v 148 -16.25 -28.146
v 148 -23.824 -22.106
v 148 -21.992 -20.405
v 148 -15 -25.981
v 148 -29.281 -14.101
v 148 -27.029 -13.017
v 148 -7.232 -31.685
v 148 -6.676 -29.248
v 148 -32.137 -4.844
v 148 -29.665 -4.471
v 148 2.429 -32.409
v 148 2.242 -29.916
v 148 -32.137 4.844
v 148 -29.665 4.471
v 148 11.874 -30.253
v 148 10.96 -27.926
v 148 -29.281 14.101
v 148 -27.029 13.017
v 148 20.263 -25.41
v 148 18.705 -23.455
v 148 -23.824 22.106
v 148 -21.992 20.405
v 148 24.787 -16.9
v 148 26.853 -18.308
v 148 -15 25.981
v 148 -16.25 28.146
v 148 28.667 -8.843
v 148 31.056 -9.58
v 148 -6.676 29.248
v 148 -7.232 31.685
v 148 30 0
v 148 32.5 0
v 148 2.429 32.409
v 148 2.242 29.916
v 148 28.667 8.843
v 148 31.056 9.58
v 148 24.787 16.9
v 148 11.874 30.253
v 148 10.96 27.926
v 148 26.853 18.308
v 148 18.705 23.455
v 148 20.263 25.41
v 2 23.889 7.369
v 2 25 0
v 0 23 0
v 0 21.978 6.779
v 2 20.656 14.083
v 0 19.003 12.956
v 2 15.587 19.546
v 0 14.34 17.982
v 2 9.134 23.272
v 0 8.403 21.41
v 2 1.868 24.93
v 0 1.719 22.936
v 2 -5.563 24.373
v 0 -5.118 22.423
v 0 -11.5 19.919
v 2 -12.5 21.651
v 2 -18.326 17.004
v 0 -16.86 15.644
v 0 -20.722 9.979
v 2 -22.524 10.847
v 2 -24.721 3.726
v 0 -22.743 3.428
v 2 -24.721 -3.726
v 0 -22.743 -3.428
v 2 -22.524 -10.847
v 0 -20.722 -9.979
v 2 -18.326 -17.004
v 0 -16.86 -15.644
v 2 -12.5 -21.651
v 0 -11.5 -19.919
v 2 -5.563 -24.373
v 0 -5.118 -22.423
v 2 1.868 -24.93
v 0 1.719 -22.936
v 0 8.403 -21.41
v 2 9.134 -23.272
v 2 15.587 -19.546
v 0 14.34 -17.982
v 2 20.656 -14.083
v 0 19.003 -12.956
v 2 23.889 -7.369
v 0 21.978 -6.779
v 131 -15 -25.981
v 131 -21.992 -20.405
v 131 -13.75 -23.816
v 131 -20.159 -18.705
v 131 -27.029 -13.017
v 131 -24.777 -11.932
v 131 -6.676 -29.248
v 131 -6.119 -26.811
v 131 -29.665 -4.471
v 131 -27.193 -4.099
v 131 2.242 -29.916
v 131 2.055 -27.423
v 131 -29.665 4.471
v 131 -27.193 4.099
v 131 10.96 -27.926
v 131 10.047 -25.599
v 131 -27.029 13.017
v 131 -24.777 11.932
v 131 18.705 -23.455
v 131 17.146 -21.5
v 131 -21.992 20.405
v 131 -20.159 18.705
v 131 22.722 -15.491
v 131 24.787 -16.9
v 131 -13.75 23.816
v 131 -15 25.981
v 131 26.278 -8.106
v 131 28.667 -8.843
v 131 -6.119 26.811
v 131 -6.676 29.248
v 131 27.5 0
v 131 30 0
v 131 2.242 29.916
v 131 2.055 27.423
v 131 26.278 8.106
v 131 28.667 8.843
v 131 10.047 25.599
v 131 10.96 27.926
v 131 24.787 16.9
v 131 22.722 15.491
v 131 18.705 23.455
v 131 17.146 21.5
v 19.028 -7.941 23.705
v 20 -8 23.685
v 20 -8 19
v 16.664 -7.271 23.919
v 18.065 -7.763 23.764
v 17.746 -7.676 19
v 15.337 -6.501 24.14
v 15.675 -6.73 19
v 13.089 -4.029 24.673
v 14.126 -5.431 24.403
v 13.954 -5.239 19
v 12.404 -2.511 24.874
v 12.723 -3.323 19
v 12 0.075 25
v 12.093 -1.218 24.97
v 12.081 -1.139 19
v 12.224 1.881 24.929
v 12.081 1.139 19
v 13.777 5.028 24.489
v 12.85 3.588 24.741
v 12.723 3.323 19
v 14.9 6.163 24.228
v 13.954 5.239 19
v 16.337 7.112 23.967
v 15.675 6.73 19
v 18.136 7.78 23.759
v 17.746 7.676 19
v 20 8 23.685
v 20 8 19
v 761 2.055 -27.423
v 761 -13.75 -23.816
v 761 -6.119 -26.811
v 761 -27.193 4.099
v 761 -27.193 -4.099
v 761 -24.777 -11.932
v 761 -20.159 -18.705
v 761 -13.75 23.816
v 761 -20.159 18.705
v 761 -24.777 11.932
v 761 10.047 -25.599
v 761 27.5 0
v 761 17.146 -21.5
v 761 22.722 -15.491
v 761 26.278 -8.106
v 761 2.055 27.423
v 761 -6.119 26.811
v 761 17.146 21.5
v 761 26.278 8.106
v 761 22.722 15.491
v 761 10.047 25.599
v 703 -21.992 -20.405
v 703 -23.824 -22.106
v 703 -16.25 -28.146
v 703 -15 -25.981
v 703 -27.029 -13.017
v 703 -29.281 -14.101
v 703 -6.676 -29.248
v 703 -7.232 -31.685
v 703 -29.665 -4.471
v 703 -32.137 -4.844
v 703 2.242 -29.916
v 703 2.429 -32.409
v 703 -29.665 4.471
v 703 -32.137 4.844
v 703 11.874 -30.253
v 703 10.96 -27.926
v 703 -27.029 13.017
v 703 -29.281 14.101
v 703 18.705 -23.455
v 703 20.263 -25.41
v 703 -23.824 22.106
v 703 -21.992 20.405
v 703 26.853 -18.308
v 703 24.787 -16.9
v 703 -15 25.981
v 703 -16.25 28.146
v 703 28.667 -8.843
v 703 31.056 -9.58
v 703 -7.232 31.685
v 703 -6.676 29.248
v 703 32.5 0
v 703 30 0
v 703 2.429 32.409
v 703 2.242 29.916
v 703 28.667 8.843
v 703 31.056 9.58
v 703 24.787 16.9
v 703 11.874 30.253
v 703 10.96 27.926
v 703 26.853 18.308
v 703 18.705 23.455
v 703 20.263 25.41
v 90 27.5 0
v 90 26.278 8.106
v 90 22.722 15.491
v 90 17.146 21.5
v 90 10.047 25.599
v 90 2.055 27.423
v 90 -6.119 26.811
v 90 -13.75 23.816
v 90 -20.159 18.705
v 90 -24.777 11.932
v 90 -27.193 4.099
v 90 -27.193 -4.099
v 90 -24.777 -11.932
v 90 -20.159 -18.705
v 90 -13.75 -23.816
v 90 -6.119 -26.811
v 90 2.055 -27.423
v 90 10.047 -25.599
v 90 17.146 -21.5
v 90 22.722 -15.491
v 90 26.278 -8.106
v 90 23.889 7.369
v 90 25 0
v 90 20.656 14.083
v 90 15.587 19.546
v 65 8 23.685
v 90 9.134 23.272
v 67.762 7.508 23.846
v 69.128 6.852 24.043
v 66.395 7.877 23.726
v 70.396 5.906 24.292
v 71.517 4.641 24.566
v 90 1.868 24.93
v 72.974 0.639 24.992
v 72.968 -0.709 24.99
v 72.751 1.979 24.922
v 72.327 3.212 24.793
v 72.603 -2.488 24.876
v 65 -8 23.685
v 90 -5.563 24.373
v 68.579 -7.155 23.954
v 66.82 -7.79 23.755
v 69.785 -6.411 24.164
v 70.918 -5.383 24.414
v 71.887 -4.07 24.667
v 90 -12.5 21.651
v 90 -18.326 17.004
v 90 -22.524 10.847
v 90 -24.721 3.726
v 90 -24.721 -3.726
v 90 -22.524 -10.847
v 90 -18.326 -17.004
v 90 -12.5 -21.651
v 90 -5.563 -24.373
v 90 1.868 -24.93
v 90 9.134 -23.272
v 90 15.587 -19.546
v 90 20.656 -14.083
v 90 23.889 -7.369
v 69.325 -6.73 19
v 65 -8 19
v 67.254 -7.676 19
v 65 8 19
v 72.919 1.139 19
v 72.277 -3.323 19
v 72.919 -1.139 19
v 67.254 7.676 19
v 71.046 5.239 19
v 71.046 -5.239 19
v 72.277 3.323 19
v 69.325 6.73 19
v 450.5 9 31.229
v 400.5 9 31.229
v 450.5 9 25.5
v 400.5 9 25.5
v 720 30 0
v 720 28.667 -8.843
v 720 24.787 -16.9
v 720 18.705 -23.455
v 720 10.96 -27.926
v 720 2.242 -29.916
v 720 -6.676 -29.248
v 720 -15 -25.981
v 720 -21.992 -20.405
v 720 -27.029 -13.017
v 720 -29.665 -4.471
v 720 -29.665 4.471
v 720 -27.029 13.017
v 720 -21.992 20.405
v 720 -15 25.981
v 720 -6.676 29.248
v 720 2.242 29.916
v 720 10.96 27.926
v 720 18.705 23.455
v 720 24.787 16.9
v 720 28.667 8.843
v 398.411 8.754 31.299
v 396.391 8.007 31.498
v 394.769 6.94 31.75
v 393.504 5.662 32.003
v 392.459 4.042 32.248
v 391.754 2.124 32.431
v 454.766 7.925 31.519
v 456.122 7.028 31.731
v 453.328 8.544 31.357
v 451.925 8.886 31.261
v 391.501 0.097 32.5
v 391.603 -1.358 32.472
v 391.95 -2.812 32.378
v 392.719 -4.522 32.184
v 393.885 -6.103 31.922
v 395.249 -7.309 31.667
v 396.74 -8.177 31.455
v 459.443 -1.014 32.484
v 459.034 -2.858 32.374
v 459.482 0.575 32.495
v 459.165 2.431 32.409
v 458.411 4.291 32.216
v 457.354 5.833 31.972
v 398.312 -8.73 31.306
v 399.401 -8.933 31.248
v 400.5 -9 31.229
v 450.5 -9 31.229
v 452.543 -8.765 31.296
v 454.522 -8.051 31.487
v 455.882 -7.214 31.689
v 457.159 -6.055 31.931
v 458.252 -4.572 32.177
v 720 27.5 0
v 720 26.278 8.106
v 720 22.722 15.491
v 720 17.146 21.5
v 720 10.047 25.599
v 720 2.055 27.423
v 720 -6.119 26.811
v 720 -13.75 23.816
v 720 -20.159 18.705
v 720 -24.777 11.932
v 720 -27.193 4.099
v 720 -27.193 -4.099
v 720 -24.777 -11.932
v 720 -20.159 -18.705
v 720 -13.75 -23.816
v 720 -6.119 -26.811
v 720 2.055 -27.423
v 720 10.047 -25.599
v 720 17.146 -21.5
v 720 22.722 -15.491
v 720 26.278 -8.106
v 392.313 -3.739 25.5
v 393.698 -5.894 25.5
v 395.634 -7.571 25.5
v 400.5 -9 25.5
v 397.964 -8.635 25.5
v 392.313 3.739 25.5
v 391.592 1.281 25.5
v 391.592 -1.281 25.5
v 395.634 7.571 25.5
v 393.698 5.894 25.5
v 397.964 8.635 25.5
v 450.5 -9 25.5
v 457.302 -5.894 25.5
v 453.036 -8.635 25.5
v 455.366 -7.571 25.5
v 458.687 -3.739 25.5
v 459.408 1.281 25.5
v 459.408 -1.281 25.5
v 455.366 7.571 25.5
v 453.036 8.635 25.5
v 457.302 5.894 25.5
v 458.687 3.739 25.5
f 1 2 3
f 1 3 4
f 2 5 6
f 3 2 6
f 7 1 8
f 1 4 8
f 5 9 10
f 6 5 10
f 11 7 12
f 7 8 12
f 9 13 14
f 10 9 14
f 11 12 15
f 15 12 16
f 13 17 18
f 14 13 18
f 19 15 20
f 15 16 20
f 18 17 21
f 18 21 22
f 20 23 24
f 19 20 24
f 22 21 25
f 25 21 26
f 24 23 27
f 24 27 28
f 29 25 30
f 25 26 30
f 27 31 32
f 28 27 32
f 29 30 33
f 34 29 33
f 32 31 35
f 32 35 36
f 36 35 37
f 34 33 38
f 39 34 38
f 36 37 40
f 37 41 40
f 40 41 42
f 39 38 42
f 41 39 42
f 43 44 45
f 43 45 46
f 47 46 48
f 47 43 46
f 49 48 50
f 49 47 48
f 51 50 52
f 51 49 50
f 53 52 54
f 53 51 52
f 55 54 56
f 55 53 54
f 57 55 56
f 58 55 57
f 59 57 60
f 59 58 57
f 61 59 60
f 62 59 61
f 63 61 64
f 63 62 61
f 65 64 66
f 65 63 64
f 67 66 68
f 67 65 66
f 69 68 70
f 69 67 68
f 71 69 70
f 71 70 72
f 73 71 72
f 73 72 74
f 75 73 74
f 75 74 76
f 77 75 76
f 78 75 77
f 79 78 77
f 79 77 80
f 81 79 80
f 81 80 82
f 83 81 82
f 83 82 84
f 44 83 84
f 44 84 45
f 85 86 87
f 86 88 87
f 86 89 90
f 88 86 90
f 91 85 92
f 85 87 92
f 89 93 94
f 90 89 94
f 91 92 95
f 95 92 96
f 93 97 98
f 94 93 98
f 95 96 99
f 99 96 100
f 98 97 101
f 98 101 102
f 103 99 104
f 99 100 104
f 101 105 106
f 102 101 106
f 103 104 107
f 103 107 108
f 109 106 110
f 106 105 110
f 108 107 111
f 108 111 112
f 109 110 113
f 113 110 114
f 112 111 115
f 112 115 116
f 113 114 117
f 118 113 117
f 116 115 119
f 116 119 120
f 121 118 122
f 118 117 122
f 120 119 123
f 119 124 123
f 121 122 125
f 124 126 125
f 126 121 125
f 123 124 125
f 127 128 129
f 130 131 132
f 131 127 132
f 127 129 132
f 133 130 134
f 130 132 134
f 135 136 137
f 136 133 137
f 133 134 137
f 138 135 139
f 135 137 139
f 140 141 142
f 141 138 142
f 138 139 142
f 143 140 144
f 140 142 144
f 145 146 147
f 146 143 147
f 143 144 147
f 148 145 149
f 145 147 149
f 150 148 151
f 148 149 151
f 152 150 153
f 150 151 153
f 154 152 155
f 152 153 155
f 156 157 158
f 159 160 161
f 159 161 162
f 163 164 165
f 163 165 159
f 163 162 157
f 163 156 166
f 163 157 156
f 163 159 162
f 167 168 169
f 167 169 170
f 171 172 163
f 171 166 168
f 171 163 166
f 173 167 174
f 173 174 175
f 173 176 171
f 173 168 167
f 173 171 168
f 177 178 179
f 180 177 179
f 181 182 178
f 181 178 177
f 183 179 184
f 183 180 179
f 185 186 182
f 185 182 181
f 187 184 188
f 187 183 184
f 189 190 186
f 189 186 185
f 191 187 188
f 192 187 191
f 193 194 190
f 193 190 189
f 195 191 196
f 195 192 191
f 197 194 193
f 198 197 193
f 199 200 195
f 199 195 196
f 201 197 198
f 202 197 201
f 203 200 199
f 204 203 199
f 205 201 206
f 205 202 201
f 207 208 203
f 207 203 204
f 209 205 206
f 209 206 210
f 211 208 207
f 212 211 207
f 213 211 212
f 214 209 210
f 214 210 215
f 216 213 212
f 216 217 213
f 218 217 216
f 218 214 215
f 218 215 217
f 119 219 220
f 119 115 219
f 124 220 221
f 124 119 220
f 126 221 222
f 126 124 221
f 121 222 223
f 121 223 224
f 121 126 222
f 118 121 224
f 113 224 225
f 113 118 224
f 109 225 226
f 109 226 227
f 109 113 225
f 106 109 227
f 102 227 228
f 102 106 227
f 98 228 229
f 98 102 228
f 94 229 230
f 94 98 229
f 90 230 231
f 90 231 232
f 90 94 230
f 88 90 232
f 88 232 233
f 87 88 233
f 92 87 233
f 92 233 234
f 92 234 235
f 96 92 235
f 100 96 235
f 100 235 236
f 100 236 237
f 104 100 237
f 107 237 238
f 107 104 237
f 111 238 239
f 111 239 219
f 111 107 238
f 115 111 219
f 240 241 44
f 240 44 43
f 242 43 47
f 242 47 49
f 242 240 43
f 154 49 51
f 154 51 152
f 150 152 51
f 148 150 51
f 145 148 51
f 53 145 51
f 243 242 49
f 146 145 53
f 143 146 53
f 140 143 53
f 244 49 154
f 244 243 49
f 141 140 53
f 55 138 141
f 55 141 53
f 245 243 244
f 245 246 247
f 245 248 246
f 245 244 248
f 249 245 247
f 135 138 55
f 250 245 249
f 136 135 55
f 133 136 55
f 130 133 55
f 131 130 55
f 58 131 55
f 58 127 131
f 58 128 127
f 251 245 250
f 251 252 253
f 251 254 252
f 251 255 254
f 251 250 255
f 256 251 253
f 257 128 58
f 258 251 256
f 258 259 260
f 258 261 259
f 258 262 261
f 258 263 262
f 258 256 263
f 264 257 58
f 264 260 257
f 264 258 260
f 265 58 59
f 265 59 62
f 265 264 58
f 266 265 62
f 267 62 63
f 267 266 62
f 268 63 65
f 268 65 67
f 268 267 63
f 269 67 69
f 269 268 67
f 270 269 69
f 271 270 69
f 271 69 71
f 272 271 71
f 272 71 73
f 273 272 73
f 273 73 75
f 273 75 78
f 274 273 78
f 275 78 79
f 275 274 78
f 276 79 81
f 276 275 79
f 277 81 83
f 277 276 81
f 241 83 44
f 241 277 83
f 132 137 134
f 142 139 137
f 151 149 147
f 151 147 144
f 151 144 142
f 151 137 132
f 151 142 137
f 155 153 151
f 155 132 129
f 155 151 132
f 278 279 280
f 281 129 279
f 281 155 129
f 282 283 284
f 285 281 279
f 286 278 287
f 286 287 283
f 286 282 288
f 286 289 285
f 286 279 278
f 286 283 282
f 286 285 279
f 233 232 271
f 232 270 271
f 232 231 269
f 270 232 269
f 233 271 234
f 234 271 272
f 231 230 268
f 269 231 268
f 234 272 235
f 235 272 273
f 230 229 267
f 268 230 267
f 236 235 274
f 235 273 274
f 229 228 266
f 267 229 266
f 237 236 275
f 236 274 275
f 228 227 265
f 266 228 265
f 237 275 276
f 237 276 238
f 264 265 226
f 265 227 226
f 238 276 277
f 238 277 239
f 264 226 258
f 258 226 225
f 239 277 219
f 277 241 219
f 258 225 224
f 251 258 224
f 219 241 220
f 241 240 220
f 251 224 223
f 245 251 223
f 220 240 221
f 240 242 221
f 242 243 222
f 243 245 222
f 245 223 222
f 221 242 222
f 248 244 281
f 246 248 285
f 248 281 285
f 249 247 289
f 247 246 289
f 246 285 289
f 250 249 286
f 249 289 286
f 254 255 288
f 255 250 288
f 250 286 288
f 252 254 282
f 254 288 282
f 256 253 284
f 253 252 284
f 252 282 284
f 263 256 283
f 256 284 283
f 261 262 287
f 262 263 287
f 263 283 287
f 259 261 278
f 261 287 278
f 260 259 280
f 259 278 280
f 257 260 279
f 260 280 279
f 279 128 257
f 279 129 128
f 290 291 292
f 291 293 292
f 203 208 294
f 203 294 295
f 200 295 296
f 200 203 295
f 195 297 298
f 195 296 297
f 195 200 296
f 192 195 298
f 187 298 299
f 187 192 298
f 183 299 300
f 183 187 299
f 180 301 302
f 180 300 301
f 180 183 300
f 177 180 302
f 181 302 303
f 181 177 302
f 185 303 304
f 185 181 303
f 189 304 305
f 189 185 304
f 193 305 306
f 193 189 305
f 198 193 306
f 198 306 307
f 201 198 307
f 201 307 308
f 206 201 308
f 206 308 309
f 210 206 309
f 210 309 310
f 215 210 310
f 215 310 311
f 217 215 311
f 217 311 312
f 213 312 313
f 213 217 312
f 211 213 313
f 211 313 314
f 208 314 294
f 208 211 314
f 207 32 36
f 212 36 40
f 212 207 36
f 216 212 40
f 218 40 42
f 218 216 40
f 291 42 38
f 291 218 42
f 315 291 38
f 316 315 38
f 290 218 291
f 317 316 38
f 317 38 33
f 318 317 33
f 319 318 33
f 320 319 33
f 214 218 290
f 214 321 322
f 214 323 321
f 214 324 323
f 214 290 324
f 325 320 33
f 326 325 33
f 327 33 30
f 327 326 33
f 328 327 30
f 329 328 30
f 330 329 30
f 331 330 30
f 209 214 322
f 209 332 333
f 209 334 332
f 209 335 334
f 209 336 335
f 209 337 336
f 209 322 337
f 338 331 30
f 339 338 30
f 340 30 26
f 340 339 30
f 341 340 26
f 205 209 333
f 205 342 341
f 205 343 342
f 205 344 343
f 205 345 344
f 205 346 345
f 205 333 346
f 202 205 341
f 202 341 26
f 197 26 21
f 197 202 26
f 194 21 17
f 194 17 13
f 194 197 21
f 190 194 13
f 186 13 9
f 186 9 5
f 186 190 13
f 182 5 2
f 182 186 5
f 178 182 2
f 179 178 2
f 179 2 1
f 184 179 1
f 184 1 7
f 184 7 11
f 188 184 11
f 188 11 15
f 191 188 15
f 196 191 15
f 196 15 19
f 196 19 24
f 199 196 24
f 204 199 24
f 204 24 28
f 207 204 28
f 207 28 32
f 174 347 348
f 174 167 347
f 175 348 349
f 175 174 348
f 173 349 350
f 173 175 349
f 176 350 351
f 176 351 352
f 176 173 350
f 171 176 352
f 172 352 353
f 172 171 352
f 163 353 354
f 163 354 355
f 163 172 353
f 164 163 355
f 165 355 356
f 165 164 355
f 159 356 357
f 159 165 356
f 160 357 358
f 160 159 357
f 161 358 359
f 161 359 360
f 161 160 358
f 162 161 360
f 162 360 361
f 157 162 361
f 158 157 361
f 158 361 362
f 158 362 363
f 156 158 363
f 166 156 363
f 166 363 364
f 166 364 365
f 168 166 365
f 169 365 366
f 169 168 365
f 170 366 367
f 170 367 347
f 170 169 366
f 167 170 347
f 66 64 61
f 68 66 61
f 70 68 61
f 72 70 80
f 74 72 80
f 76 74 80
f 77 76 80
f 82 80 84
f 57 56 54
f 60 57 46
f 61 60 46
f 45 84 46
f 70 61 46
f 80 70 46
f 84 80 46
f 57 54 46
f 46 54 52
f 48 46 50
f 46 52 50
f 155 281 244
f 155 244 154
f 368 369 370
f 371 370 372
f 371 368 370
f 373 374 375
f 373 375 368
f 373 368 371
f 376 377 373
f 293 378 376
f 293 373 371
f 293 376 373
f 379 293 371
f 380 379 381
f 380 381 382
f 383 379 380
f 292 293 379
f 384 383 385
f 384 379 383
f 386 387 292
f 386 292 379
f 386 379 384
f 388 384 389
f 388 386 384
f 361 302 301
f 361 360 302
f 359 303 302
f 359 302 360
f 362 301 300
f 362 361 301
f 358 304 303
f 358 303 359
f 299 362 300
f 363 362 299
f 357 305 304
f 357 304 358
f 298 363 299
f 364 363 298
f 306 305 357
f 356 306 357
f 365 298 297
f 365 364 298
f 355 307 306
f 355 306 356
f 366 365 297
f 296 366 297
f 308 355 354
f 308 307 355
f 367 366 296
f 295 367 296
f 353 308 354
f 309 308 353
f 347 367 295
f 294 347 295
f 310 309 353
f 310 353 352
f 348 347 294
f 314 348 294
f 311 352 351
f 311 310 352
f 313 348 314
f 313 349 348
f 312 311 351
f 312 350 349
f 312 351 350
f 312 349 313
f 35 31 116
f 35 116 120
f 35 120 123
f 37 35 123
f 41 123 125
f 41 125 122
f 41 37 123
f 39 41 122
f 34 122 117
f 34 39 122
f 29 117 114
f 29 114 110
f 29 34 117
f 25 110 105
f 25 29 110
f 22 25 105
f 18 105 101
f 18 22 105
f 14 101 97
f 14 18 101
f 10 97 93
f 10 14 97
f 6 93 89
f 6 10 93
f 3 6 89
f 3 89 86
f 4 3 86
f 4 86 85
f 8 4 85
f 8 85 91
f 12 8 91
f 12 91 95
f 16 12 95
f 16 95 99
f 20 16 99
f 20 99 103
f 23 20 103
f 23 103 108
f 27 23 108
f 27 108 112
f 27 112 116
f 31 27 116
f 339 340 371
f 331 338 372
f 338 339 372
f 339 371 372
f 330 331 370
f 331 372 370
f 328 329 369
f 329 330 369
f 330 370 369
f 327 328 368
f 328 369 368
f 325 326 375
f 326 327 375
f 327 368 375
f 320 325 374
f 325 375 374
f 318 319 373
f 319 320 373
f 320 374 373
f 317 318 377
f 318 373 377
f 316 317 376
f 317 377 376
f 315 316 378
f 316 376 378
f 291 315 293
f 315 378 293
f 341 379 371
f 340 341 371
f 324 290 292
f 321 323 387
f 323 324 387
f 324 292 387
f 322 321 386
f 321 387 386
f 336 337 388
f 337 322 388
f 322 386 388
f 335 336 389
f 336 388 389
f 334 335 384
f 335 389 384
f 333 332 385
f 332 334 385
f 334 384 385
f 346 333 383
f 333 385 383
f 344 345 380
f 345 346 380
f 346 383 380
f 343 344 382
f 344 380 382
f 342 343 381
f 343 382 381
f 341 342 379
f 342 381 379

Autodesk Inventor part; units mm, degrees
ref_plane "YZ Plane" through (0, 0, 0) normal (1, 0, 0) x (0, 1, 0)
sketch "Эскиз1" plane through (0, 0, 0) normal (0, 0, 1) x (1, 0, 0)
  line L0 (0, 0) -> (761, 0)
  line L1 (0, 0) -> (0, 25)
  line L2 (0, 25) -> (90, 25)
  line L3 (90, 25) -> (90, 27.5)
  line L4 (90, 27.5) -> (131, 27.5)
  line L5 (131, 27.5) -> (131, 30)
  line L6 (425.5, 30) -> (425.5, 0) construction
  line L7 (720, 27.5) -> (720, 30)
  line L8 (131, 30) -> (148, 30)
  line L9 (148, 30) -> (148, 32.5)
  line L10 (148, 32.5) -> (181, 32.5)
  line L11 (720, 30) -> (703, 30)
  line L12 (703, 30) -> (703, 32.5)
  line L13 (703, 32.5) -> (181, 32.5)
  line L14 (720, 27.5) -> (761, 27.5)
  line L15 (761, 27.5) -> (761, 0)
  dimension "d0" = 50
  dimension "d1" = 55
  dimension "d2" = 90
  dimension "d3" = 41
  dimension "d14" = 17
  dimension "d15" = 60
  dimension "d16" = 65
  dimension "d27" = 41
  dimension "d29" = 630
revolve "Вращение1" add sketch "Эскиз1" angle 360 about axis through (0, 0, 0) along (1, 0, 0)
ref_plane "РабПлоскость1" through (0, 0, 19) normal (0, 0, 1) x (1, 0, 0)
sketch "Эскиз2" plane through (0, 0, 19) normal (0, 0, 1) x (1, 0, 0)
  line L0 (65, 8) -> (20, 8)
  line L1 (20, 8) -> (20, -8)
  line L2 (20, -8) -> (65, -8)
  line L3 (65, -8) -> (65, 8)
  arc A0 (65, -8) -> (65, 8) centre (65, 0) ccw
  arc A1 (20, 8) -> (20, -8) centre (20, 0) ccw
  point P0 (0, 0)
  dimension "d8" = 8
  dimension "d9" = 16
  dimension "d10" = 45
  dimension "d11" = 20
extrude "Выдавливание1" cut sketch "Эскиз2" along normal blind 33
ref_plane "РабПлоскость2" through (0, 0, 25.5) normal (0, 0, 1) x (1, 0, 0)
sketch "Эскиз3" plane through (0, 0, 25.5) normal (0, 0, 1) x (1, 0, 0)
  line L0 (148, -32.5) -> (148, 32.5) projected
  line L1 (400.5, 9) -> (450.5, 9)
  line L2 (450.5, 9) -> (450.5, -9)
  line L3 (450.5, -9) -> (400.5, -9)
  line L4 (400.5, -9) -> (400.5, 9)
  arc A0 (400.5, 9) -> (400.5, -9) centre (400.5, 0) ccw
  arc A1 (450.5, -9) -> (450.5, 9) centre (450.5, 0) ccw
  line L5 (703, -30) -> (703, 30) projected
  point P0 (0, 0)
  dimension "d19" = 18
  dimension "d20" = 252.5
  dimension "d21" = 50
  dimension "d22" = 9
  dimension "d26" = 555
extrude "Выдавливание2" cut sketch "Эскиз3" along normal blind 44.75
chamfer "Фаска1" distance 2 angle 45 1 edges at (0, -25, 0)
equation "\"d27\" = d3"
equation "\"d8\" = 0.5 * d9"
equation "\"d22\" = 0.5 * d19"
properties part number "Валл" material "Сталь, углеродистая"
